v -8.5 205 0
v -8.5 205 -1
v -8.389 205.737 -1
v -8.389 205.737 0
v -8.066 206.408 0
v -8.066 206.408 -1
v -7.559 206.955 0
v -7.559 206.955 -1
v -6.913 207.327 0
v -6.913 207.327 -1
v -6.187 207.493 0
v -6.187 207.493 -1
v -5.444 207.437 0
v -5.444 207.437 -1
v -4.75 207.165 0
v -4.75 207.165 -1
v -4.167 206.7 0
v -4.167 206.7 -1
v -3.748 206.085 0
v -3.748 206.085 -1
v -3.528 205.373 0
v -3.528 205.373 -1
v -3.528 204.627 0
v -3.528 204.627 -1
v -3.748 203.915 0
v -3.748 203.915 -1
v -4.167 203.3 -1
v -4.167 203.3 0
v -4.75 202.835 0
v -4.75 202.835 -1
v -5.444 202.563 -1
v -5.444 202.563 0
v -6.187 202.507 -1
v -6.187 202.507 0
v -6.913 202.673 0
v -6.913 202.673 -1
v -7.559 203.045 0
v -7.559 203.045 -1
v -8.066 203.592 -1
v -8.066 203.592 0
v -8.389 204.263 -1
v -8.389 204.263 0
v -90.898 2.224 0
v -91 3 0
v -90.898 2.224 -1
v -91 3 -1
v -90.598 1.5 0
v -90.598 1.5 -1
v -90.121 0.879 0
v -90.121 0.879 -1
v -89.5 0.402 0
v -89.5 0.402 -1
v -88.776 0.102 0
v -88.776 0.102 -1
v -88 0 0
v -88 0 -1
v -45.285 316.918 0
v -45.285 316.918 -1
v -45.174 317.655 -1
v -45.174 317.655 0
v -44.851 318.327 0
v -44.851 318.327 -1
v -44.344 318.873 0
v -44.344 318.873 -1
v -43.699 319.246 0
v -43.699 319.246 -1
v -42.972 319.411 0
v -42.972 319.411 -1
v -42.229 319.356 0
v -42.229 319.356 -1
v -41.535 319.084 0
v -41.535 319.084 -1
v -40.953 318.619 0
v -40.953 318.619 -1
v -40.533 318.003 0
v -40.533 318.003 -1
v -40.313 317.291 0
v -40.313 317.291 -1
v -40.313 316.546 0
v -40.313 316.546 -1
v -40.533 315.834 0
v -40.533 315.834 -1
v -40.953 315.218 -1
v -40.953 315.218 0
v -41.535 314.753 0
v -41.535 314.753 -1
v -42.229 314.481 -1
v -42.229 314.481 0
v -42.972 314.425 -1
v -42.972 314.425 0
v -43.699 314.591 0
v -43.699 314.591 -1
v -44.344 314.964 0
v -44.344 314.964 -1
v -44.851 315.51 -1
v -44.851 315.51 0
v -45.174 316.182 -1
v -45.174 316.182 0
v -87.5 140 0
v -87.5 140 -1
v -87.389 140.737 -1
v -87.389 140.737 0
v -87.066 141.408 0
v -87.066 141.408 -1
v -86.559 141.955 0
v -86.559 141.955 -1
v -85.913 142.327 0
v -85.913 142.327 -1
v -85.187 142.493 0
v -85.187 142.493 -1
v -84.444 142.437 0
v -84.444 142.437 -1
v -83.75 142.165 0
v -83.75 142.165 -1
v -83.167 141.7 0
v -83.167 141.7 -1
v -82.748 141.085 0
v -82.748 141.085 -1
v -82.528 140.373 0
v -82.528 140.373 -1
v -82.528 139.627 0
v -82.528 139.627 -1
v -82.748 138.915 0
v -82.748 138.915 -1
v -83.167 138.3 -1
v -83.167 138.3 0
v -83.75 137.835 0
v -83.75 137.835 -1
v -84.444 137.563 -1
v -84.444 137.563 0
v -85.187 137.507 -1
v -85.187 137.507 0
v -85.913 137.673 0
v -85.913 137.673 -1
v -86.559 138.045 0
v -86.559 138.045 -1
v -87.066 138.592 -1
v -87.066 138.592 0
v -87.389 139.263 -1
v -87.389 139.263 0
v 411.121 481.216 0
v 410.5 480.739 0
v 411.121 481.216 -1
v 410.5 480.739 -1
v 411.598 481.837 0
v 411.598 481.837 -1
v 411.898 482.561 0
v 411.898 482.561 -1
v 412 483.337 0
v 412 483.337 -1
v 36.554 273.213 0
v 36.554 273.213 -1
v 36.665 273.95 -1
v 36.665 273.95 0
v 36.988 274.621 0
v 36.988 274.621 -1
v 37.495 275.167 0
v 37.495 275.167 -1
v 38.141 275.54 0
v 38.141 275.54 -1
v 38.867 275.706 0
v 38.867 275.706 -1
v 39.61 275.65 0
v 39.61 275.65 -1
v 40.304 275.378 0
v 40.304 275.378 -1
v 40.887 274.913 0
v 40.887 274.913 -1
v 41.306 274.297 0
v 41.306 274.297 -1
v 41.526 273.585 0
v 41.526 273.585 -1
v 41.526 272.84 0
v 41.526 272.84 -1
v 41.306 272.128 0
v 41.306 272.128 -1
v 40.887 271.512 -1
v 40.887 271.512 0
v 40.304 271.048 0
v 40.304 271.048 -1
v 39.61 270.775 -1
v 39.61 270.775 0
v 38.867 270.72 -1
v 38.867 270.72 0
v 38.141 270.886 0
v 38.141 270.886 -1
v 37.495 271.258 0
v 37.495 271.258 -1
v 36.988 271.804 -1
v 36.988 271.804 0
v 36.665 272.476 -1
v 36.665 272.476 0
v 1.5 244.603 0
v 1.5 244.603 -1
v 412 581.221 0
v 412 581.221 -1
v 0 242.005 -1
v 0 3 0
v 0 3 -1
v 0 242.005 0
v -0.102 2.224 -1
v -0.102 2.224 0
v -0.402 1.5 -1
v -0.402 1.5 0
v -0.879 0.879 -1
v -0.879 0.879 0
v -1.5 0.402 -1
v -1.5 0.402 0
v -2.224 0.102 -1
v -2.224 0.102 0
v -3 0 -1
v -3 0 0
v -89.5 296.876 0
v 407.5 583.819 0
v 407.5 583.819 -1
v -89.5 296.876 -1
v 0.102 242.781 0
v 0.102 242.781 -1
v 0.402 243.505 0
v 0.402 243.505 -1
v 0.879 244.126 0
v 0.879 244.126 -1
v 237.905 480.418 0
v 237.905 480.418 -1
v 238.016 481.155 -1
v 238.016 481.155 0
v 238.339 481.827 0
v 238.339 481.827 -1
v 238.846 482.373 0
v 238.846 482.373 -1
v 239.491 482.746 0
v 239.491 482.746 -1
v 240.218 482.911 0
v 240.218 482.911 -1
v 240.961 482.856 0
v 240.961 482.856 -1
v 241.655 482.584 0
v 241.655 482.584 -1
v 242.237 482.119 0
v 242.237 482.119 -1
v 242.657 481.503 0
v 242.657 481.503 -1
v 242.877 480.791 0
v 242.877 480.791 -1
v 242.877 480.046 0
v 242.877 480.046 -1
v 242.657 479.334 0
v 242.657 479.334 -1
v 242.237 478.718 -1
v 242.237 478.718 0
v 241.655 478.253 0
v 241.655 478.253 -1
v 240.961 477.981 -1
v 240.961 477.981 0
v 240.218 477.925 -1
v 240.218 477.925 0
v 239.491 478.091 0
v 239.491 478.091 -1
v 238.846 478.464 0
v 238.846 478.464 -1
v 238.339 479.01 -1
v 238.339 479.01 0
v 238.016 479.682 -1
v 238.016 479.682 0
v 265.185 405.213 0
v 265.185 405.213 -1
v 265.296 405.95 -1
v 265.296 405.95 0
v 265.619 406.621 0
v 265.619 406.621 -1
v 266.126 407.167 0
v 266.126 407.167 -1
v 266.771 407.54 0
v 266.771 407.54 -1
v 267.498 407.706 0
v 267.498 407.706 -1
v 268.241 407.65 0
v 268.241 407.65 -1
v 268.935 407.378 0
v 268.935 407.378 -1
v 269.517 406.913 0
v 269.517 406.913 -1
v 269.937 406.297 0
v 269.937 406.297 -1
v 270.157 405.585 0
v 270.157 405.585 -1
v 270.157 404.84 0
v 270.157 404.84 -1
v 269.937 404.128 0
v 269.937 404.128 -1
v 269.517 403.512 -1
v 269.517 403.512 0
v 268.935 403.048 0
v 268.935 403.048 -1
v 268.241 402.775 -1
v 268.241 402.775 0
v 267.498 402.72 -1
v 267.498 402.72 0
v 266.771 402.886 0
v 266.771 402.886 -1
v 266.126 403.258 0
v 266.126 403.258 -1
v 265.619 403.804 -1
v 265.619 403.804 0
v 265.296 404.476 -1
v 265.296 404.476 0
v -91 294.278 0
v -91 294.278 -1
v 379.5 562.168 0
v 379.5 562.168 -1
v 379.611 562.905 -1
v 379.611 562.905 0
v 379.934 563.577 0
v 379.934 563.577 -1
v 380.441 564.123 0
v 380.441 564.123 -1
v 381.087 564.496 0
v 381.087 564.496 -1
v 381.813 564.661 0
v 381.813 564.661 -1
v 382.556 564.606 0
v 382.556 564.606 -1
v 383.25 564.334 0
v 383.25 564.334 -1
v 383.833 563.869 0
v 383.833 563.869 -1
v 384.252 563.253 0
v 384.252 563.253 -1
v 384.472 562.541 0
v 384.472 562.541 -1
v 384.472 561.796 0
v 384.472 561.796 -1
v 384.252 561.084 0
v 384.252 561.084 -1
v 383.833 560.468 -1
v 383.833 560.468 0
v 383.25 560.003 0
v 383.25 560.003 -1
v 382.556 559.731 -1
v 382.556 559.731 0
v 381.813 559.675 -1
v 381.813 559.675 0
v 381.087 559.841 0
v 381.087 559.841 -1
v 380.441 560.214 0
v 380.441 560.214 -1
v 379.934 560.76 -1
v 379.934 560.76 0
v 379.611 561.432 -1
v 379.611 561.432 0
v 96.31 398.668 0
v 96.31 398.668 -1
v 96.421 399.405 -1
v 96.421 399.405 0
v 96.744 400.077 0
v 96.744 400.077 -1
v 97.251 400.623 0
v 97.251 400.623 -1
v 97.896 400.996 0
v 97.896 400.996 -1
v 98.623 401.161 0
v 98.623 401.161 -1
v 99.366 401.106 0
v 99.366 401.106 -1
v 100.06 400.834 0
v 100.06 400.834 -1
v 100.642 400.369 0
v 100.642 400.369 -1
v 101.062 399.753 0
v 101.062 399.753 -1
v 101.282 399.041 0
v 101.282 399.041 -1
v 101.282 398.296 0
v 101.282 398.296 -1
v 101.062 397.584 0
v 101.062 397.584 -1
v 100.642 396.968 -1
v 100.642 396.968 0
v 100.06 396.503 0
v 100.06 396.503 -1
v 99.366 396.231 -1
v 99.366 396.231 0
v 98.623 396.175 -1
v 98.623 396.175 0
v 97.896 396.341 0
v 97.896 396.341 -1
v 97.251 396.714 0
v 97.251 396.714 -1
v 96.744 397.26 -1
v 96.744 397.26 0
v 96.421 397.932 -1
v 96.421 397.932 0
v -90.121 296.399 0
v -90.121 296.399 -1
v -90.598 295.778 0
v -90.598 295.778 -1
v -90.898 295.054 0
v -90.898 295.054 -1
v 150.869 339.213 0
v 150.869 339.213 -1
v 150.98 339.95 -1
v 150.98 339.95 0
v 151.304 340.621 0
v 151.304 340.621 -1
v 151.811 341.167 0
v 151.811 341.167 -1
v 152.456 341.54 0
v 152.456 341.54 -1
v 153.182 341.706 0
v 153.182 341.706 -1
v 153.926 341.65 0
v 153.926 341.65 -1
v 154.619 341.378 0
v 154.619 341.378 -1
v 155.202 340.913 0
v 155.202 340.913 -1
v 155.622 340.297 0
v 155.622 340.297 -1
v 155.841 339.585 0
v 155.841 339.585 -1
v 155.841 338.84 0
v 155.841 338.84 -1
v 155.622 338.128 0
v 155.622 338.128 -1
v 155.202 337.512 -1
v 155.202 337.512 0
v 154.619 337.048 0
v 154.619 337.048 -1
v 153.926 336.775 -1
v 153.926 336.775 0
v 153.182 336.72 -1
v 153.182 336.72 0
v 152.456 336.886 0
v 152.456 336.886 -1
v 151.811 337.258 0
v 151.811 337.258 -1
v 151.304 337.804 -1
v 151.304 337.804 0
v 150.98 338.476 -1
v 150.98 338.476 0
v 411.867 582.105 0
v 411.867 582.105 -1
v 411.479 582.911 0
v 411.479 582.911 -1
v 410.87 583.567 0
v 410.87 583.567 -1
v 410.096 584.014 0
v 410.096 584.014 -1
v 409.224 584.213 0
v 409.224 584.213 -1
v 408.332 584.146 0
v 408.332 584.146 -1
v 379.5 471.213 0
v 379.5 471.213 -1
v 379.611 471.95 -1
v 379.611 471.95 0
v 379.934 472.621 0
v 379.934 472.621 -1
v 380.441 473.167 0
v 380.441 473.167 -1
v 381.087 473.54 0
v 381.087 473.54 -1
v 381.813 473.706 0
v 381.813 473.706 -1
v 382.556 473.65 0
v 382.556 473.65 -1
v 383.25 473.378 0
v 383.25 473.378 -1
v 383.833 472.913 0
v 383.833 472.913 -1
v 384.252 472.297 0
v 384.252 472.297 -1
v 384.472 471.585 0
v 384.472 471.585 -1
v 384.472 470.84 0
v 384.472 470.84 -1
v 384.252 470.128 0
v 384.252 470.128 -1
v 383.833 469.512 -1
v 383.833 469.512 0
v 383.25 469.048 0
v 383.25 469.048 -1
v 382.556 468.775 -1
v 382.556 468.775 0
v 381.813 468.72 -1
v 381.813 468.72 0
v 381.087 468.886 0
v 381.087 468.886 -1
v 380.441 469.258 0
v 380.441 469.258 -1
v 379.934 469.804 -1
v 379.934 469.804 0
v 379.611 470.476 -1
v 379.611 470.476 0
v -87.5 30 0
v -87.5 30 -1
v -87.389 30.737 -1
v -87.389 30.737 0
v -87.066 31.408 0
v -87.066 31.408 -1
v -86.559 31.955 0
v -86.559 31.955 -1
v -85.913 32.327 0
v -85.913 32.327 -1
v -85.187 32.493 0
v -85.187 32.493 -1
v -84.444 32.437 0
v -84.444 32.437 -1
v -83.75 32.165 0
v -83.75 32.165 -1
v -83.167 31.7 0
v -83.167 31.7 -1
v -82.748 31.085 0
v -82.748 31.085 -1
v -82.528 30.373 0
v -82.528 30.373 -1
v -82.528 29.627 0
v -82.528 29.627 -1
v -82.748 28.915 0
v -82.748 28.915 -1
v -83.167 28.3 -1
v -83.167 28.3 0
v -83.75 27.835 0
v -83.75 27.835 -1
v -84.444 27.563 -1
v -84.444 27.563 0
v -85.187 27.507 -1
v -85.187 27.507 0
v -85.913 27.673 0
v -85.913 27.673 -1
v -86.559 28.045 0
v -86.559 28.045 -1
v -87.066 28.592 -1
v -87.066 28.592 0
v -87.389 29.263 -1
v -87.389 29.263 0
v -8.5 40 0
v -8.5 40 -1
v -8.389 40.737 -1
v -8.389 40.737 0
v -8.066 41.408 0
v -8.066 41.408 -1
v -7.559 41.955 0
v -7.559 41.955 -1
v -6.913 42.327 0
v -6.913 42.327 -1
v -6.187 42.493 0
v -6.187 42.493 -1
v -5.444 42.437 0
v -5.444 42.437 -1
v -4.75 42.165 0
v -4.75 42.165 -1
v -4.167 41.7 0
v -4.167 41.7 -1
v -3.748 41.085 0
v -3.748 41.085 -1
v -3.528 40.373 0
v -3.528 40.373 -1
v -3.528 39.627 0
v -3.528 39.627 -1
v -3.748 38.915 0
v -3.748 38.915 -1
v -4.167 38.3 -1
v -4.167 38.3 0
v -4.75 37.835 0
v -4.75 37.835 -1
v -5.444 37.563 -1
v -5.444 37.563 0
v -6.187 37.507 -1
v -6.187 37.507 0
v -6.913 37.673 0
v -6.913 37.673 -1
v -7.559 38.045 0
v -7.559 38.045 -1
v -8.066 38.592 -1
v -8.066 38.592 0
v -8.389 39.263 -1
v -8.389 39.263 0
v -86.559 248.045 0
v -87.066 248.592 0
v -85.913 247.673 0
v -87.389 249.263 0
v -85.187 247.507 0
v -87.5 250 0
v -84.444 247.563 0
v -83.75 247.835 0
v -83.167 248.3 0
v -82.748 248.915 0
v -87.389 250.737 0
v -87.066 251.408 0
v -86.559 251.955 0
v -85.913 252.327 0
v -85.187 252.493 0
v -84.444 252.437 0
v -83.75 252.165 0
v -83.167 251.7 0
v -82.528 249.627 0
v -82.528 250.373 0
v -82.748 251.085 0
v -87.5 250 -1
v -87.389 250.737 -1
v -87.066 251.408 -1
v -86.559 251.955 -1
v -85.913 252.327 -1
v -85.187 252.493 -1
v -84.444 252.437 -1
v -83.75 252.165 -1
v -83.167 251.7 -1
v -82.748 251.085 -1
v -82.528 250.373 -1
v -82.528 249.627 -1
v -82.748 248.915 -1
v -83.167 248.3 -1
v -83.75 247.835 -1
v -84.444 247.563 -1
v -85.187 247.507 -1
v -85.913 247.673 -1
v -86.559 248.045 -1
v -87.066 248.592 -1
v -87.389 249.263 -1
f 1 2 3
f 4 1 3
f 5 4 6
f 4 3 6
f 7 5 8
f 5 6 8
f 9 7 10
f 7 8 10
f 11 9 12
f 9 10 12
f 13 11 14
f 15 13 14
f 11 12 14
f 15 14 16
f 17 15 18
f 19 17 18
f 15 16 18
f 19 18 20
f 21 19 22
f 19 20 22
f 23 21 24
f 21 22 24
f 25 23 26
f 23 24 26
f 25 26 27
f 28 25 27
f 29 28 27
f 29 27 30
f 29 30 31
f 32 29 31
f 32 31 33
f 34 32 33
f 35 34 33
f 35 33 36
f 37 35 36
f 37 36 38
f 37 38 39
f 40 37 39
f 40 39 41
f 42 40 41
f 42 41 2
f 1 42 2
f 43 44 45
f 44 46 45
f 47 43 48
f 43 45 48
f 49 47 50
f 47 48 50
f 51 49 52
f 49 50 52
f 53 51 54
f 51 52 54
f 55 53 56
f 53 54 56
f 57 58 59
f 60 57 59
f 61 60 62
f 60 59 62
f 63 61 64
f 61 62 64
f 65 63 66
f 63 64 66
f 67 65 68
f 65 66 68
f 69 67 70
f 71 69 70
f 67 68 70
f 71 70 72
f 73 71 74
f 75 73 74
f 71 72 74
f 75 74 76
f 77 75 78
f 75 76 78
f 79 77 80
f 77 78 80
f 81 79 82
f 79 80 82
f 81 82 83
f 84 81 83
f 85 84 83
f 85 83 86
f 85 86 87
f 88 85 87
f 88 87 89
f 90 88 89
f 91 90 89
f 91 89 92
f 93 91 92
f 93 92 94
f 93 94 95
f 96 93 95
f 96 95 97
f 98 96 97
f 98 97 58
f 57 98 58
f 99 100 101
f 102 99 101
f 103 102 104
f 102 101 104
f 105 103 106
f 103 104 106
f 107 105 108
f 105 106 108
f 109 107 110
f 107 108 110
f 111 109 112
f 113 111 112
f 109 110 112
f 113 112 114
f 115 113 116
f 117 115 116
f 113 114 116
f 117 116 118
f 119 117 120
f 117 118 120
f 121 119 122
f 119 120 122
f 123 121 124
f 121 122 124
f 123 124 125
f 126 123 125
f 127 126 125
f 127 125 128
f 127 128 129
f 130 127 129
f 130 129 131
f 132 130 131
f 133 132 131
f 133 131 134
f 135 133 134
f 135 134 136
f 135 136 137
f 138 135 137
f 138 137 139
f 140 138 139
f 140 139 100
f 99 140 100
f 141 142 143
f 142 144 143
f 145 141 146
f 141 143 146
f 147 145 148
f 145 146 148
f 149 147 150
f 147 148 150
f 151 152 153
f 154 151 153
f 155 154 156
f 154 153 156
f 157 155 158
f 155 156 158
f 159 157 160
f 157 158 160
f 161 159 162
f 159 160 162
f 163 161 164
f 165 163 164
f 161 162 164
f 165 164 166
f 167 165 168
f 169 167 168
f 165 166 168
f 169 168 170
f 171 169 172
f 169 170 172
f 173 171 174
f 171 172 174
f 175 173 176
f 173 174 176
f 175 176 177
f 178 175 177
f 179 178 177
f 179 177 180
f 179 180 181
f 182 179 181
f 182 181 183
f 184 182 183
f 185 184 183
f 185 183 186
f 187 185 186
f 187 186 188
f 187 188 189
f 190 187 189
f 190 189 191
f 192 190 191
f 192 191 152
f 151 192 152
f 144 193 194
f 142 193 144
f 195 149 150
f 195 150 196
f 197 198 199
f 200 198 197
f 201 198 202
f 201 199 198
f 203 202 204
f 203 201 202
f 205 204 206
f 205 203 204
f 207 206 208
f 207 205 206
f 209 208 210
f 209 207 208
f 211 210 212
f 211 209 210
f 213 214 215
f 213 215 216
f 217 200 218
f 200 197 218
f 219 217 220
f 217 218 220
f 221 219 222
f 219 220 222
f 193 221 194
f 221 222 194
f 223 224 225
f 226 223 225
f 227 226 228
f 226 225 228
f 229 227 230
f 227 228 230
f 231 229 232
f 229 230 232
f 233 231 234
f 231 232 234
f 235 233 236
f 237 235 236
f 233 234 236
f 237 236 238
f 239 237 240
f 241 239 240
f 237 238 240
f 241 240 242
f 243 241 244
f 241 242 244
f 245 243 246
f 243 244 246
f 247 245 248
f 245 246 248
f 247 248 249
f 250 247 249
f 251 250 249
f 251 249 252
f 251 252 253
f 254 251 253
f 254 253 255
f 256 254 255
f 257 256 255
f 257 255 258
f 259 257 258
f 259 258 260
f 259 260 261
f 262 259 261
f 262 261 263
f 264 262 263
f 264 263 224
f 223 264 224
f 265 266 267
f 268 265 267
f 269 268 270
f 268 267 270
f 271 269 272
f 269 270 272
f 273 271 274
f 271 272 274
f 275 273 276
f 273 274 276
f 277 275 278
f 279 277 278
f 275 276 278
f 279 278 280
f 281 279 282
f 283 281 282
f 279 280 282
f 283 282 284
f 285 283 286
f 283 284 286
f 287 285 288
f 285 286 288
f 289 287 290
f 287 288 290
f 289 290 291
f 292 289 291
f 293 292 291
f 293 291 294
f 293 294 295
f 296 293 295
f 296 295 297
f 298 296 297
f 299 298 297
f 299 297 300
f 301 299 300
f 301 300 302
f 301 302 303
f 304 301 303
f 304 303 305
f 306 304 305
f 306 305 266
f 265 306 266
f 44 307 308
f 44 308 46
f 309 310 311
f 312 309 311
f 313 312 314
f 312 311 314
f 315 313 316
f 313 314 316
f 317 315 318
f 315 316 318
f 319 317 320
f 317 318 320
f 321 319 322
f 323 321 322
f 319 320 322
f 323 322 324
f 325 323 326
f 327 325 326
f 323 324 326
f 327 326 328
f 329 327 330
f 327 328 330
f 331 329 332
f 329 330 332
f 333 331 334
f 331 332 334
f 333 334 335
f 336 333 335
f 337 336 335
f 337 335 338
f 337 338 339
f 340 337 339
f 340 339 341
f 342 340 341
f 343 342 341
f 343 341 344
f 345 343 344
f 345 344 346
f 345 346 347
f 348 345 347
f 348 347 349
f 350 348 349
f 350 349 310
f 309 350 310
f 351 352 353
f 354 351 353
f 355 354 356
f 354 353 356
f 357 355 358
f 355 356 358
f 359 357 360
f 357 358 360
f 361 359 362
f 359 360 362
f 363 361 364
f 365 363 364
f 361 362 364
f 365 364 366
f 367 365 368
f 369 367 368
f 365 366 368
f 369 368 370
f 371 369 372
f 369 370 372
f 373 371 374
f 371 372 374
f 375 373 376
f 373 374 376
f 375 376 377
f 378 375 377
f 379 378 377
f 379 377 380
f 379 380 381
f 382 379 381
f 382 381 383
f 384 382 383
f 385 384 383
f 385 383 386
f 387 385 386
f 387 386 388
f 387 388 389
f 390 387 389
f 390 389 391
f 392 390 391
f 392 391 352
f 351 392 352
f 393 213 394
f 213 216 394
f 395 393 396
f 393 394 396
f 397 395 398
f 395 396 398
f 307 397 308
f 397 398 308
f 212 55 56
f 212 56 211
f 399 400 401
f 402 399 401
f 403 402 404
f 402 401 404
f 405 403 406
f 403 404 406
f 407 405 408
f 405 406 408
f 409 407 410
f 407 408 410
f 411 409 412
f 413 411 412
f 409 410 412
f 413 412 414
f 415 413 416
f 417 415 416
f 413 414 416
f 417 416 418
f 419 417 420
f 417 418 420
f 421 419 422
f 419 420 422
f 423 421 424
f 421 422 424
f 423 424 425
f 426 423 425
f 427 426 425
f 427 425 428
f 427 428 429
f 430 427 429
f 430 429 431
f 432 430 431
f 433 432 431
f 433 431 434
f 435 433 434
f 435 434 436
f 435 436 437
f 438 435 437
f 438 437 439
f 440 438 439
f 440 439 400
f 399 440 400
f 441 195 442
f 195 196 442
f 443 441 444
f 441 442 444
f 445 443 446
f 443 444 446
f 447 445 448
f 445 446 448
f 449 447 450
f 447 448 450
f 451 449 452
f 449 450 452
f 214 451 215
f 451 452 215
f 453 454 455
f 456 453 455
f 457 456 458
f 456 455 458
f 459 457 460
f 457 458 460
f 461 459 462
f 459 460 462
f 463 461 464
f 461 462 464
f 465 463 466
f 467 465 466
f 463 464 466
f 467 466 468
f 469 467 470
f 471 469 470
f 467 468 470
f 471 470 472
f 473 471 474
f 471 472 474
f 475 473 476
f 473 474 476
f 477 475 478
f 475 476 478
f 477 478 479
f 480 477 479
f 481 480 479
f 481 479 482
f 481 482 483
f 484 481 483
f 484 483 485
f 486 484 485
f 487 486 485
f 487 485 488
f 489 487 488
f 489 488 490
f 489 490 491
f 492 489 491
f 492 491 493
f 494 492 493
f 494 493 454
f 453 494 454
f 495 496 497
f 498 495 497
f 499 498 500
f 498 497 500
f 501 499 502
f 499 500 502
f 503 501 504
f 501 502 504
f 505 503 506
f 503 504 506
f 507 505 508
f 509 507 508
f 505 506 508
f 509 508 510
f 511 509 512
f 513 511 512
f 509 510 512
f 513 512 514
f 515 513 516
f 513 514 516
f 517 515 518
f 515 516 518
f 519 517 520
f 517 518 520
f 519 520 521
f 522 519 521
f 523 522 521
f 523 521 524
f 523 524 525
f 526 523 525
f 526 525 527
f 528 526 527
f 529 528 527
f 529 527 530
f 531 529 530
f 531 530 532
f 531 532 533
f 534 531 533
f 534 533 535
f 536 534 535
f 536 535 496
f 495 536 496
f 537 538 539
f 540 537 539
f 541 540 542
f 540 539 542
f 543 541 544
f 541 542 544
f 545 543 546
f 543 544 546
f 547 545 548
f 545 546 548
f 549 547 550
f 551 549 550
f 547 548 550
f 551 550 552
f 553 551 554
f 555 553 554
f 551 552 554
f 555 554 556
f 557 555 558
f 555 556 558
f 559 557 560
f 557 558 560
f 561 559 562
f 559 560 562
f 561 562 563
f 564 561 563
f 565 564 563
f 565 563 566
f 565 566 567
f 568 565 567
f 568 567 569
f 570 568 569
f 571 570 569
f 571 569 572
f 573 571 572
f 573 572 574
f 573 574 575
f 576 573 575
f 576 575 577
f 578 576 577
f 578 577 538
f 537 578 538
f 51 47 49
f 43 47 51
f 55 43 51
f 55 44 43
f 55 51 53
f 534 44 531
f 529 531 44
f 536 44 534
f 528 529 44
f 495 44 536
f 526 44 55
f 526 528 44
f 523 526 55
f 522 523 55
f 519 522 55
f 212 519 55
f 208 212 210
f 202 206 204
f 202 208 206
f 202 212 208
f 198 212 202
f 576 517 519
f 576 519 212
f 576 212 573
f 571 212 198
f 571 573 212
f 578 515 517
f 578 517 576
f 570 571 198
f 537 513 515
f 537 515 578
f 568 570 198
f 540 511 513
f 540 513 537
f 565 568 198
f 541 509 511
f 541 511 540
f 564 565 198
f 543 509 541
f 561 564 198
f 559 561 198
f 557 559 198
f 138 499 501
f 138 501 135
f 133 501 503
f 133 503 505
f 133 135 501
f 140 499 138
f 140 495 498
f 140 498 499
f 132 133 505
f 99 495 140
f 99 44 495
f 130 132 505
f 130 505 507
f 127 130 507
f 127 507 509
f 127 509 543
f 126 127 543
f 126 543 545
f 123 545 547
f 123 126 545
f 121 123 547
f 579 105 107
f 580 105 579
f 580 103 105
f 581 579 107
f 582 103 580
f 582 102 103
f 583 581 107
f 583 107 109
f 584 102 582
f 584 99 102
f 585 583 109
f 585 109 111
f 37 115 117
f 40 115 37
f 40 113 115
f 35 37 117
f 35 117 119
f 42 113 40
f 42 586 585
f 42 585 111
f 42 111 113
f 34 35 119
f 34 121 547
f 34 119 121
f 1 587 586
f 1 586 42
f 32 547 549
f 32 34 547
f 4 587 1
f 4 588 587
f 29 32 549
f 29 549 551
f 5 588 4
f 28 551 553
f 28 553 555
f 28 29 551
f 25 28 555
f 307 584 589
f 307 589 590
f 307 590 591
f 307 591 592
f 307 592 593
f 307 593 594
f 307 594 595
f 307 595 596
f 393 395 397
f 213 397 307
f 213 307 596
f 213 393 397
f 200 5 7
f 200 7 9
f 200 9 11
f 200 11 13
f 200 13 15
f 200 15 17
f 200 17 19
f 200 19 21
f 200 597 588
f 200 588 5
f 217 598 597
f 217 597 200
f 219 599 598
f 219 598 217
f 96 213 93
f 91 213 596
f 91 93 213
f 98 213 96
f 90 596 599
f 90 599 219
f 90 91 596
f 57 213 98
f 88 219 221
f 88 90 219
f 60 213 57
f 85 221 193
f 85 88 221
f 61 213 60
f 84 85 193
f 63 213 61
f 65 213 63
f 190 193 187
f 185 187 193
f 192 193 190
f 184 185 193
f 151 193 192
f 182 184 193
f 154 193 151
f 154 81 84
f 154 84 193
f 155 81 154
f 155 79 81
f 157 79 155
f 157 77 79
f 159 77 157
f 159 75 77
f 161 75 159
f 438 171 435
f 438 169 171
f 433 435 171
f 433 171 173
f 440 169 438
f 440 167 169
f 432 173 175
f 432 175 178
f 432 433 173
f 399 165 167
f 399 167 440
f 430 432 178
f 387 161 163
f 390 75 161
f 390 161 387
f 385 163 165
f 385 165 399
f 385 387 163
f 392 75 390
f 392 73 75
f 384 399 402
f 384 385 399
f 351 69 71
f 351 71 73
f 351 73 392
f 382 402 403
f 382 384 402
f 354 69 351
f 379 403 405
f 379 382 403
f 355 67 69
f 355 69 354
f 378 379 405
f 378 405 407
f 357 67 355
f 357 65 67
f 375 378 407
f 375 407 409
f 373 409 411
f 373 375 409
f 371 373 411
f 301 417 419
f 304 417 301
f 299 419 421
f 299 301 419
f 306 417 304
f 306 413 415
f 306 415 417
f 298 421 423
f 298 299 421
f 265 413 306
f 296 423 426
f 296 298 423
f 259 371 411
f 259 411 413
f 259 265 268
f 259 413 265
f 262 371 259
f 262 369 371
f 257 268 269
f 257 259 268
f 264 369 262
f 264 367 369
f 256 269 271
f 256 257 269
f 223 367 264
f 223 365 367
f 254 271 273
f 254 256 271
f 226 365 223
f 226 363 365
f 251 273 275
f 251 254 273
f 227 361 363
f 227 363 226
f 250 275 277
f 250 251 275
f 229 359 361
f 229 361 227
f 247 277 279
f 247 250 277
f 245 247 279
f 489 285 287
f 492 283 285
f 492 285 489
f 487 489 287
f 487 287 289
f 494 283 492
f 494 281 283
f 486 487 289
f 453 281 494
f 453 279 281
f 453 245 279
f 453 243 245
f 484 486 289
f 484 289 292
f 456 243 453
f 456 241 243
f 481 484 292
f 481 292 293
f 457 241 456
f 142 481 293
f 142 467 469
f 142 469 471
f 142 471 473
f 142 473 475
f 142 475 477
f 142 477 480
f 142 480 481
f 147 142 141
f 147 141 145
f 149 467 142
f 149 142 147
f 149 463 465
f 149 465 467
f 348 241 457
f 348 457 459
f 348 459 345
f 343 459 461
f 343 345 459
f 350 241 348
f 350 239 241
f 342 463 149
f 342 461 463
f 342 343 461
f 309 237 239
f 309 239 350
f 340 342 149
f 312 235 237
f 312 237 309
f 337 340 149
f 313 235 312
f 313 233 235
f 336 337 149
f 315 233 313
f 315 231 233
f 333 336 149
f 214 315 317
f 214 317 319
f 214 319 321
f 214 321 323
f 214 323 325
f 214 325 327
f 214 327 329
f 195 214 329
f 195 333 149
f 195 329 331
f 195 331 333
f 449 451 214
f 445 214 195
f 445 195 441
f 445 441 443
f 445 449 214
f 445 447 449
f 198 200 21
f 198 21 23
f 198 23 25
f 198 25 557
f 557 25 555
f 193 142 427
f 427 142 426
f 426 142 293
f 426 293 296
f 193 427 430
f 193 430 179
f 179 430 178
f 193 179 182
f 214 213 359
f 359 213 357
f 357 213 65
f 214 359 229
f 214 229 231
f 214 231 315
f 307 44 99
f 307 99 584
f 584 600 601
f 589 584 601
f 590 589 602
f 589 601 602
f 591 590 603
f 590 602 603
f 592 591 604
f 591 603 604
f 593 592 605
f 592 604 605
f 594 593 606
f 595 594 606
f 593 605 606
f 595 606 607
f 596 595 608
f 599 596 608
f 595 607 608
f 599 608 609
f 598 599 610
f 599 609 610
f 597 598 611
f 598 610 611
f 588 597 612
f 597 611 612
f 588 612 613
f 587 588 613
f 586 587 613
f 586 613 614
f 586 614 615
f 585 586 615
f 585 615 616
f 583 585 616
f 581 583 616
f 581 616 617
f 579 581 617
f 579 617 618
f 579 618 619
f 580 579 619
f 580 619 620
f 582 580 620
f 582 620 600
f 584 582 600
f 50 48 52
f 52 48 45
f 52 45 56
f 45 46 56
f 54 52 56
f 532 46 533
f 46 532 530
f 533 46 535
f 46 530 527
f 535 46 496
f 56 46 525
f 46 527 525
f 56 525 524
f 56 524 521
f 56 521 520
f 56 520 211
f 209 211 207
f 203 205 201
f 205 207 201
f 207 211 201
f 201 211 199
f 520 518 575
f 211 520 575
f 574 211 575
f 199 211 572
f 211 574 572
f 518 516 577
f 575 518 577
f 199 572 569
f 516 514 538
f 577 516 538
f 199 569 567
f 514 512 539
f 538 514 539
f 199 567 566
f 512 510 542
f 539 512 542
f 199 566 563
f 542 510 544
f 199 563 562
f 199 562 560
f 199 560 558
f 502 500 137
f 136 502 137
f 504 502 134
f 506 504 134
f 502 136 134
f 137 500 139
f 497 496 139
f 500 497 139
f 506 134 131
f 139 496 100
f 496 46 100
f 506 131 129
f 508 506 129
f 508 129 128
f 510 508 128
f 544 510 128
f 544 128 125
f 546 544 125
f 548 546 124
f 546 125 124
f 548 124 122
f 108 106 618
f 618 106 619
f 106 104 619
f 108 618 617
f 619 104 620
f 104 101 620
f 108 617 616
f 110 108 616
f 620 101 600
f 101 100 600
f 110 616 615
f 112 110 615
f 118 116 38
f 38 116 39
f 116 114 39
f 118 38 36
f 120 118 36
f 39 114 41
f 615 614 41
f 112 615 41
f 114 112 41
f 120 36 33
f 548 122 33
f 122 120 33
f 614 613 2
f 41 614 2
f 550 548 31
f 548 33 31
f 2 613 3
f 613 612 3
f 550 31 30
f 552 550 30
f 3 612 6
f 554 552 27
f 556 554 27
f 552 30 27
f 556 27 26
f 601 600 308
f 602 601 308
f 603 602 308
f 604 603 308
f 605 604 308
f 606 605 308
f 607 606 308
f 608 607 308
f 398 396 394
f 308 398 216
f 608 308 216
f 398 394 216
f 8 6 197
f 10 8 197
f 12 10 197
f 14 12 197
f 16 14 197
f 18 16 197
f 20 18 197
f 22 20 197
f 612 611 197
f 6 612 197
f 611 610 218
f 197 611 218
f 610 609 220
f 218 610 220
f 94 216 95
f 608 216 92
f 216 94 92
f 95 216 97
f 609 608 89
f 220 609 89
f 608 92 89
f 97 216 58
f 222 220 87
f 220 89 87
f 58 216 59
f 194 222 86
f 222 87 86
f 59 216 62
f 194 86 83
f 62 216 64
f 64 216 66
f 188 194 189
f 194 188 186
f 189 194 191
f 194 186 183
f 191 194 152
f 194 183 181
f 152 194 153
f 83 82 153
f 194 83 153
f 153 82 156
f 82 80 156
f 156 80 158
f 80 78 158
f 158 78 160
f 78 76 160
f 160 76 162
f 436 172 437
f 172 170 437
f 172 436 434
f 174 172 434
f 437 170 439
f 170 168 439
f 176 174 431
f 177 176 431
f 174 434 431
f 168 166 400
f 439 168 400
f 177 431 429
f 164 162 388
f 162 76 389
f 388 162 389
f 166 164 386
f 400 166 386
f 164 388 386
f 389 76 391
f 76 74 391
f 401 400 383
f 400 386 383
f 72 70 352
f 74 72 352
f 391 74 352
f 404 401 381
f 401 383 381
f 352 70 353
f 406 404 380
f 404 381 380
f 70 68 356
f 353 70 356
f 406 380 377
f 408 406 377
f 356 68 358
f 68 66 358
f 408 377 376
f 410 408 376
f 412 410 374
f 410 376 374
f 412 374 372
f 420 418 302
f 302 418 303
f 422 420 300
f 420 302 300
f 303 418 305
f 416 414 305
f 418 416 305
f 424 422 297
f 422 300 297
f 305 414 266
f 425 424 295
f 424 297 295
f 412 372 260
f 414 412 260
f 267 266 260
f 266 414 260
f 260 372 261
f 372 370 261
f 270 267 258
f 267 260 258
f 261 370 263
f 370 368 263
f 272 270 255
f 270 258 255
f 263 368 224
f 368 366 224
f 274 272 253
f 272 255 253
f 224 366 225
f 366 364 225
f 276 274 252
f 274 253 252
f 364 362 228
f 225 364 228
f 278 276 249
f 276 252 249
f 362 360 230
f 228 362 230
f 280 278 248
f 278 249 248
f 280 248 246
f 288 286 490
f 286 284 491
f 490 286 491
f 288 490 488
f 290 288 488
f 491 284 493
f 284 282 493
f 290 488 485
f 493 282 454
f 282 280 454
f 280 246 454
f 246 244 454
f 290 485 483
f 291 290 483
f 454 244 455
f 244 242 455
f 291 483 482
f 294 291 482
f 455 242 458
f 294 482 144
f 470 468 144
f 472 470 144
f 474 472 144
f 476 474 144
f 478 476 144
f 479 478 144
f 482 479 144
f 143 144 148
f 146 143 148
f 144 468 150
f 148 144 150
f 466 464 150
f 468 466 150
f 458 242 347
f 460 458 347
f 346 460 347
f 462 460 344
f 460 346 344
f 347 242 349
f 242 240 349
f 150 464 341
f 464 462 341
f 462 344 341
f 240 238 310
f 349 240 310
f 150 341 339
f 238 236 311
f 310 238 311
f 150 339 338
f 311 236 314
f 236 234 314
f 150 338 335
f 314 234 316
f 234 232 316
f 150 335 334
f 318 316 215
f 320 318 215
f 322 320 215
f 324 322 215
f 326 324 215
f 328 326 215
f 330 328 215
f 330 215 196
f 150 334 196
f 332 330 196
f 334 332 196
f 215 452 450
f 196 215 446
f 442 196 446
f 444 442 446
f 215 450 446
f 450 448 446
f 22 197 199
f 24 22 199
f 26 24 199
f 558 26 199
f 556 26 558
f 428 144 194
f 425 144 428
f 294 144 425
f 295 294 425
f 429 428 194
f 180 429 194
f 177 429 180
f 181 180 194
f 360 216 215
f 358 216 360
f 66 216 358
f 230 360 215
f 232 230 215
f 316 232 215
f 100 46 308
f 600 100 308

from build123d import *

# Parameters (mm, degrees)
BASE_FLANGE1_DEPTH = 1
FILLET1_R          = 3
SKETCH2_R          = 2.5
CUT_EXTRUDE1_DEPTH = 10


# Sheet-metal steps are written as plain solids
with BuildPart() as part:
    # Sketch1 → Base-Flange1 (new body)
    with BuildSketch(Plane.XY):
        Polygon((0, 0), (0, 243.736706628), (412, 481.605017534), (412, 586.417185402), (-91, 296.01), (-91, 0), align=None)
    extrude(amount=-BASE_FLANGE1_DEPTH)

    # Fillet1
    fillet1_edges = [part.edges().sort_by_distance(p)[0] for p in [
        (-91, 0, -0.5),
        (-91, 296.01, -0.5),
        (412, 586.417185402, -0.5),
        (412, 481.605017534, -0.5),
        (0, 243.736706628, -0.5),
        (0, 0, -0.5),
    ]]
    fillet(fillet1_edges, radius=FILLET1_R)

    # Sketch2 → Cut-Extrude1 (cut)
    with BuildSketch(Plane(origin=(0, 0, -1), x_dir=(-1, 0, 0), z_dir=(0, 0, -1))):
        with Locations((-382, 562.168474096)):
            Circle(SKETCH2_R)
        with Locations((-240.404846481, 480.418474096)):
            Circle(SKETCH2_R)
        with Locations((-98.809692962, 398.668474096)):
            Circle(SKETCH2_R)
        with Locations((42.785460556, 316.918474096)):
            Circle(SKETCH2_R)
        with Locations((-382, 471.212712688)):
            Circle(SKETCH2_R)
        with Locations((-267.6846467, 405.212712688)):
            Circle(SKETCH2_R)
        with Locations((-153.369293401, 339.212712688)):
            Circle(SKETCH2_R)
        with Locations((-39.053940101, 273.212712688)):
            Circle(SKETCH2_R)
        with Locations((85, 30)):
            Circle(SKETCH2_R)
        with Locations((6, 40)):
            Circle(SKETCH2_R)
        with Locations((85, 140)):
            Circle(SKETCH2_R)
        with Locations((85, 250)):
            Circle(SKETCH2_R)
        with Locations((6, 205)):
            Circle(SKETCH2_R)
    extrude(amount=-CUT_EXTRUDE1_DEPTH, mode=Mode.SUBTRACT)


solid = part.part
